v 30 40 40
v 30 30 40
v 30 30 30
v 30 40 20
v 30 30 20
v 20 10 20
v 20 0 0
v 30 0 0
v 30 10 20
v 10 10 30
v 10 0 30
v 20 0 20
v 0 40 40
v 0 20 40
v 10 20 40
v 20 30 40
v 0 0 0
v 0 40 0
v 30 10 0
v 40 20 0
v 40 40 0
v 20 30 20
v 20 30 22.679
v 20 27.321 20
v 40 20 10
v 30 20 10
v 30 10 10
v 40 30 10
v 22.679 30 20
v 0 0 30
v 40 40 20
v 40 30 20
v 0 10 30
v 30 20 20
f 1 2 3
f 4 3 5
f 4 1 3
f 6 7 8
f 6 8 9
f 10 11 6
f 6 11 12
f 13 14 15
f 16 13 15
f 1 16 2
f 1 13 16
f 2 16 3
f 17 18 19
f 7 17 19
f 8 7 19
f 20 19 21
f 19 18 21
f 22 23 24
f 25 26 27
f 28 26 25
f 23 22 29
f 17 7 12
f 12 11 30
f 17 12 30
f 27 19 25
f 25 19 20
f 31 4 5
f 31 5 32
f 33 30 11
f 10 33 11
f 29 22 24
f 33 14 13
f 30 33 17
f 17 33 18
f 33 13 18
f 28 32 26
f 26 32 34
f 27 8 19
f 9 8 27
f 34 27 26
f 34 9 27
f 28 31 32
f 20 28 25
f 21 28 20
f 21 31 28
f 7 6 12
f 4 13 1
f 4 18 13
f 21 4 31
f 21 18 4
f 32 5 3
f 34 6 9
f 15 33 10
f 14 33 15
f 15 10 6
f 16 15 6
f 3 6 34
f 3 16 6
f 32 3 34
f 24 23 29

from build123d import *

# Parameters (mm, degrees)
SKETCH1_W            = 40
SKETCH1_H            = 40
BOSS_EXTRUDE1_DEPTH  = 20
CUT_EXTRUDE1_DEPTH   = 20
BOSS_EXTRUDE2_DEPTH  = 10
BOSS_EXTRUDE3_DEPTH  = 10
SKETCH5_W            = 10
SKETCH5_H            = 12.477634561
BOSS_EXTRUDE4_DEPTH  = 20
BOSS_EXTRUDE5_DEPTH  = 10
SKETCH7_W            = 30
SKETCH7_H            = 10
BOSS_EXTRUDE6_DEPTH  = 20
BOSS_EXTRUDE7_DEPTH  = 10
BOSS_EXTRUDE8_DEPTH  = 20
SKETCH13_W           = 10
SKETCH13_H           = 10
BOSS_EXTRUDE10_DEPTH = 10
BOSS_EXTRUDE13_DEPTH = 10
SKETCH15_W           = 20
SKETCH15_H           = 30.380258446
BOSS_EXTRUDE15_DEPTH = 30
CUT_EXTRUDE2_DEPTH   = 30
CUT_EXTRUDE3_DEPTH   = 30
CUT_EXTRUDE4_DEPTH   = 30
CUT_EXTRUDE5_DEPTH   = 30
BOSS_EXTRUDE16_DEPTH = 10
CUT_EXTRUDE6_DEPTH   = 10
SKETCH25_W           = 10
SKETCH25_H           = 10
CUT_EXTRUDE7_DEPTH   = 10


with BuildPart() as part:
    # Sketch1 → Boss-Extrude1 (new body)
    with BuildSketch(Plane.XY):
        with Locations((20, 20)):
            Rectangle(SKETCH1_W, SKETCH1_H)
    extrude(amount=BOSS_EXTRUDE1_DEPTH)

    # Sketch2 → Cut-Extrude1 (cut)
    with BuildSketch(Plane.XY.offset(20)):
        Polygon((20, 10), (20, 0), (40, 0), (40, 30), align=None)
    extrude(amount=-CUT_EXTRUDE1_DEPTH, mode=Mode.SUBTRACT)

    # Sketch3 → Boss-Extrude2 (add)
    with BuildSketch(Plane.XZ):
        Polygon((20, 20), (0, 20), (0, 30), (10, 30), align=None)
    extrude(amount=-BOSS_EXTRUDE2_DEPTH)

    # Sketch4 → Boss-Extrude3 (add)
    with BuildSketch(Plane(origin=(20, 0, 0), x_dir=(0, 0, -1), z_dir=(1, 0, 0))):
        Polygon((0, 0), (-20, 10), (0, 10), align=None)
    extrude(amount=BOSS_EXTRUDE3_DEPTH)

    # Sketch5 → Boss-Extrude4 (add)
    with BuildSketch(Plane.XY.offset(20)):
        with Locations((25, 16.238817281)):
            Rectangle(SKETCH5_W, SKETCH5_H)
    extrude(amount=-BOSS_EXTRUDE4_DEPTH)

    # Sketch6 → Boss-Extrude5 (add)
    with BuildSketch(Plane(origin=(0, 0, 0), x_dir=(-1, 0, 0), z_dir=(0, 0, -1))):
        Polygon((-30, 10), (-40, 20), (-40, 30), (-30, 20), align=None)
    extrude(amount=-BOSS_EXTRUDE5_DEPTH)

    # Sketch7 → Boss-Extrude6 (add)
    with BuildSketch(Plane.XY.offset(20)):
        with Locations((15, 35)):
            Rectangle(SKETCH7_W, SKETCH7_H)
    extrude(amount=BOSS_EXTRUDE6_DEPTH)

    # Sketch8 → Boss-Extrude7 (add)
    with BuildSketch(Plane.ZY):
        Polygon((40, 30), (40, 20), (30, 10), (20, 10), (20, 30), align=None)
    extrude(amount=-BOSS_EXTRUDE7_DEPTH)

    # Sketch9 → Boss-Extrude8 (add)
    with BuildSketch(Plane.XY.offset(40)):
        Polygon((10, 20), (20, 30), (10, 30), align=None)
    extrude(amount=-BOSS_EXTRUDE8_DEPTH)

    # Sketch13 → Boss-Extrude10 (add)
    with BuildSketch(Plane(origin=(0, 40, 0), x_dir=(1, 0, 0), z_dir=(0, 1, 0))):
        with Locations((35, -25)):
            Rectangle(SKETCH13_W, SKETCH13_H)
    extrude(amount=-BOSS_EXTRUDE10_DEPTH)

    # Sketch12 → Boss-Extrude13 (add)
    with BuildSketch(Plane(origin=(10, -10, 10), x_dir=(-0.816496581, -0.40824829, 0.40824829), z_dir=(-0.577350269, 0.577350269, -0.577350269))):
        Polygon((-12.247448714, 21.213203436), (0, 42.426406871), (-12.247448714, 49.497474683), (-24.494897428, 28.284271247), align=None)
    extrude(amount=BOSS_EXTRUDE13_DEPTH)

    # Sketch15 → Boss-Extrude15 (add)
    with BuildSketch(Plane(origin=(0, 40, 0), x_dir=(1, 0, 0), z_dir=(0, 1, 0))):
        with Locations((10, -24.809870777)):
            Rectangle(SKETCH15_W, SKETCH15_H)
    extrude(amount=-BOSS_EXTRUDE15_DEPTH)

    # Sketch17 → Cut-Extrude2 (cut)
    with BuildSketch(Plane(origin=(10, -10, 10), x_dir=(-0.816496581, -0.40824829, 0.40824829), z_dir=(-0.577350269, 0.577350269, -0.577350269))):
        Polygon((-12.247448714, 49.497474683), (0, 42.426406871), (-12.247448714, 21.213203436), align=None)
    extrude(amount=-CUT_EXTRUDE2_DEPTH, mode=Mode.SUBTRACT)

    # Sketch18 → Cut-Extrude3 (cut)
    with BuildSketch(Plane(origin=(10, -10, 10), x_dir=(-0.816496581, -0.40824829, 0.40824829), z_dir=(-0.577350269, 0.577350269, -0.577350269))):
        Polygon((0, 42.426406871), (0, 28.284271247), (-12.247448714, 21.213203436), align=None)
    extrude(amount=-CUT_EXTRUDE3_DEPTH, mode=Mode.SUBTRACT)

    # Sketch20 → Cut-Extrude4 (cut)
    with BuildSketch(Plane(origin=(0, 0, 0), x_dir=(-0.365148372, -0.182574186, -0.912870929), z_dir=(0.816496581, 0.40824829, -0.40824829))):
        Polygon((-32.86335345, 4.472135955), (-43.8178046, 2.236067977), (-43.8178046, 13.416407865), align=None)
    extrude(amount=-CUT_EXTRUDE4_DEPTH, mode=Mode.SUBTRACT)

    # Sketch21 → Cut-Extrude5 (cut)
    with BuildSketch(Plane.ZY):
        Polygon((30, 10), (40, 20), (40, 10), align=None)
    extrude(amount=-CUT_EXTRUDE5_DEPTH, mode=Mode.SUBTRACT)

    # Sketch23 → Boss-Extrude16 (add)
    with BuildSketch(Plane(origin=(10, -10, 10), x_dir=(-0.816496581, -0.40824829, 0.40824829), z_dir=(-0.577350269, 0.577350269, -0.577350269))):
        Polygon((-12.247448714, 49.497474683), (-24.494897428, 28.284271247), (-36.742346142, 35.355339059), align=None)
    extrude(amount=BOSS_EXTRUDE16_DEPTH)

    # Sketch24 → Cut-Extrude6 (cut)
    with BuildSketch(Plane(origin=(0, 40, 0), x_dir=(1, 0, 0), z_dir=(0, 1, 0))):
        Polygon((30, -30), (40, -20), (40, -30), align=None)
    extrude(amount=-CUT_EXTRUDE6_DEPTH, mode=Mode.SUBTRACT)

    # Sketch25 → Cut-Extrude7 (cut)
    with BuildSketch(Plane(origin=(0, 40, 0), x_dir=(1, 0, 0), z_dir=(0, 1, 0))):
        with Locations((35, -25)):
            Rectangle(SKETCH25_W, SKETCH25_H)
    extrude(amount=-CUT_EXTRUDE7_DEPTH, mode=Mode.SUBTRACT)


solid = part.part
